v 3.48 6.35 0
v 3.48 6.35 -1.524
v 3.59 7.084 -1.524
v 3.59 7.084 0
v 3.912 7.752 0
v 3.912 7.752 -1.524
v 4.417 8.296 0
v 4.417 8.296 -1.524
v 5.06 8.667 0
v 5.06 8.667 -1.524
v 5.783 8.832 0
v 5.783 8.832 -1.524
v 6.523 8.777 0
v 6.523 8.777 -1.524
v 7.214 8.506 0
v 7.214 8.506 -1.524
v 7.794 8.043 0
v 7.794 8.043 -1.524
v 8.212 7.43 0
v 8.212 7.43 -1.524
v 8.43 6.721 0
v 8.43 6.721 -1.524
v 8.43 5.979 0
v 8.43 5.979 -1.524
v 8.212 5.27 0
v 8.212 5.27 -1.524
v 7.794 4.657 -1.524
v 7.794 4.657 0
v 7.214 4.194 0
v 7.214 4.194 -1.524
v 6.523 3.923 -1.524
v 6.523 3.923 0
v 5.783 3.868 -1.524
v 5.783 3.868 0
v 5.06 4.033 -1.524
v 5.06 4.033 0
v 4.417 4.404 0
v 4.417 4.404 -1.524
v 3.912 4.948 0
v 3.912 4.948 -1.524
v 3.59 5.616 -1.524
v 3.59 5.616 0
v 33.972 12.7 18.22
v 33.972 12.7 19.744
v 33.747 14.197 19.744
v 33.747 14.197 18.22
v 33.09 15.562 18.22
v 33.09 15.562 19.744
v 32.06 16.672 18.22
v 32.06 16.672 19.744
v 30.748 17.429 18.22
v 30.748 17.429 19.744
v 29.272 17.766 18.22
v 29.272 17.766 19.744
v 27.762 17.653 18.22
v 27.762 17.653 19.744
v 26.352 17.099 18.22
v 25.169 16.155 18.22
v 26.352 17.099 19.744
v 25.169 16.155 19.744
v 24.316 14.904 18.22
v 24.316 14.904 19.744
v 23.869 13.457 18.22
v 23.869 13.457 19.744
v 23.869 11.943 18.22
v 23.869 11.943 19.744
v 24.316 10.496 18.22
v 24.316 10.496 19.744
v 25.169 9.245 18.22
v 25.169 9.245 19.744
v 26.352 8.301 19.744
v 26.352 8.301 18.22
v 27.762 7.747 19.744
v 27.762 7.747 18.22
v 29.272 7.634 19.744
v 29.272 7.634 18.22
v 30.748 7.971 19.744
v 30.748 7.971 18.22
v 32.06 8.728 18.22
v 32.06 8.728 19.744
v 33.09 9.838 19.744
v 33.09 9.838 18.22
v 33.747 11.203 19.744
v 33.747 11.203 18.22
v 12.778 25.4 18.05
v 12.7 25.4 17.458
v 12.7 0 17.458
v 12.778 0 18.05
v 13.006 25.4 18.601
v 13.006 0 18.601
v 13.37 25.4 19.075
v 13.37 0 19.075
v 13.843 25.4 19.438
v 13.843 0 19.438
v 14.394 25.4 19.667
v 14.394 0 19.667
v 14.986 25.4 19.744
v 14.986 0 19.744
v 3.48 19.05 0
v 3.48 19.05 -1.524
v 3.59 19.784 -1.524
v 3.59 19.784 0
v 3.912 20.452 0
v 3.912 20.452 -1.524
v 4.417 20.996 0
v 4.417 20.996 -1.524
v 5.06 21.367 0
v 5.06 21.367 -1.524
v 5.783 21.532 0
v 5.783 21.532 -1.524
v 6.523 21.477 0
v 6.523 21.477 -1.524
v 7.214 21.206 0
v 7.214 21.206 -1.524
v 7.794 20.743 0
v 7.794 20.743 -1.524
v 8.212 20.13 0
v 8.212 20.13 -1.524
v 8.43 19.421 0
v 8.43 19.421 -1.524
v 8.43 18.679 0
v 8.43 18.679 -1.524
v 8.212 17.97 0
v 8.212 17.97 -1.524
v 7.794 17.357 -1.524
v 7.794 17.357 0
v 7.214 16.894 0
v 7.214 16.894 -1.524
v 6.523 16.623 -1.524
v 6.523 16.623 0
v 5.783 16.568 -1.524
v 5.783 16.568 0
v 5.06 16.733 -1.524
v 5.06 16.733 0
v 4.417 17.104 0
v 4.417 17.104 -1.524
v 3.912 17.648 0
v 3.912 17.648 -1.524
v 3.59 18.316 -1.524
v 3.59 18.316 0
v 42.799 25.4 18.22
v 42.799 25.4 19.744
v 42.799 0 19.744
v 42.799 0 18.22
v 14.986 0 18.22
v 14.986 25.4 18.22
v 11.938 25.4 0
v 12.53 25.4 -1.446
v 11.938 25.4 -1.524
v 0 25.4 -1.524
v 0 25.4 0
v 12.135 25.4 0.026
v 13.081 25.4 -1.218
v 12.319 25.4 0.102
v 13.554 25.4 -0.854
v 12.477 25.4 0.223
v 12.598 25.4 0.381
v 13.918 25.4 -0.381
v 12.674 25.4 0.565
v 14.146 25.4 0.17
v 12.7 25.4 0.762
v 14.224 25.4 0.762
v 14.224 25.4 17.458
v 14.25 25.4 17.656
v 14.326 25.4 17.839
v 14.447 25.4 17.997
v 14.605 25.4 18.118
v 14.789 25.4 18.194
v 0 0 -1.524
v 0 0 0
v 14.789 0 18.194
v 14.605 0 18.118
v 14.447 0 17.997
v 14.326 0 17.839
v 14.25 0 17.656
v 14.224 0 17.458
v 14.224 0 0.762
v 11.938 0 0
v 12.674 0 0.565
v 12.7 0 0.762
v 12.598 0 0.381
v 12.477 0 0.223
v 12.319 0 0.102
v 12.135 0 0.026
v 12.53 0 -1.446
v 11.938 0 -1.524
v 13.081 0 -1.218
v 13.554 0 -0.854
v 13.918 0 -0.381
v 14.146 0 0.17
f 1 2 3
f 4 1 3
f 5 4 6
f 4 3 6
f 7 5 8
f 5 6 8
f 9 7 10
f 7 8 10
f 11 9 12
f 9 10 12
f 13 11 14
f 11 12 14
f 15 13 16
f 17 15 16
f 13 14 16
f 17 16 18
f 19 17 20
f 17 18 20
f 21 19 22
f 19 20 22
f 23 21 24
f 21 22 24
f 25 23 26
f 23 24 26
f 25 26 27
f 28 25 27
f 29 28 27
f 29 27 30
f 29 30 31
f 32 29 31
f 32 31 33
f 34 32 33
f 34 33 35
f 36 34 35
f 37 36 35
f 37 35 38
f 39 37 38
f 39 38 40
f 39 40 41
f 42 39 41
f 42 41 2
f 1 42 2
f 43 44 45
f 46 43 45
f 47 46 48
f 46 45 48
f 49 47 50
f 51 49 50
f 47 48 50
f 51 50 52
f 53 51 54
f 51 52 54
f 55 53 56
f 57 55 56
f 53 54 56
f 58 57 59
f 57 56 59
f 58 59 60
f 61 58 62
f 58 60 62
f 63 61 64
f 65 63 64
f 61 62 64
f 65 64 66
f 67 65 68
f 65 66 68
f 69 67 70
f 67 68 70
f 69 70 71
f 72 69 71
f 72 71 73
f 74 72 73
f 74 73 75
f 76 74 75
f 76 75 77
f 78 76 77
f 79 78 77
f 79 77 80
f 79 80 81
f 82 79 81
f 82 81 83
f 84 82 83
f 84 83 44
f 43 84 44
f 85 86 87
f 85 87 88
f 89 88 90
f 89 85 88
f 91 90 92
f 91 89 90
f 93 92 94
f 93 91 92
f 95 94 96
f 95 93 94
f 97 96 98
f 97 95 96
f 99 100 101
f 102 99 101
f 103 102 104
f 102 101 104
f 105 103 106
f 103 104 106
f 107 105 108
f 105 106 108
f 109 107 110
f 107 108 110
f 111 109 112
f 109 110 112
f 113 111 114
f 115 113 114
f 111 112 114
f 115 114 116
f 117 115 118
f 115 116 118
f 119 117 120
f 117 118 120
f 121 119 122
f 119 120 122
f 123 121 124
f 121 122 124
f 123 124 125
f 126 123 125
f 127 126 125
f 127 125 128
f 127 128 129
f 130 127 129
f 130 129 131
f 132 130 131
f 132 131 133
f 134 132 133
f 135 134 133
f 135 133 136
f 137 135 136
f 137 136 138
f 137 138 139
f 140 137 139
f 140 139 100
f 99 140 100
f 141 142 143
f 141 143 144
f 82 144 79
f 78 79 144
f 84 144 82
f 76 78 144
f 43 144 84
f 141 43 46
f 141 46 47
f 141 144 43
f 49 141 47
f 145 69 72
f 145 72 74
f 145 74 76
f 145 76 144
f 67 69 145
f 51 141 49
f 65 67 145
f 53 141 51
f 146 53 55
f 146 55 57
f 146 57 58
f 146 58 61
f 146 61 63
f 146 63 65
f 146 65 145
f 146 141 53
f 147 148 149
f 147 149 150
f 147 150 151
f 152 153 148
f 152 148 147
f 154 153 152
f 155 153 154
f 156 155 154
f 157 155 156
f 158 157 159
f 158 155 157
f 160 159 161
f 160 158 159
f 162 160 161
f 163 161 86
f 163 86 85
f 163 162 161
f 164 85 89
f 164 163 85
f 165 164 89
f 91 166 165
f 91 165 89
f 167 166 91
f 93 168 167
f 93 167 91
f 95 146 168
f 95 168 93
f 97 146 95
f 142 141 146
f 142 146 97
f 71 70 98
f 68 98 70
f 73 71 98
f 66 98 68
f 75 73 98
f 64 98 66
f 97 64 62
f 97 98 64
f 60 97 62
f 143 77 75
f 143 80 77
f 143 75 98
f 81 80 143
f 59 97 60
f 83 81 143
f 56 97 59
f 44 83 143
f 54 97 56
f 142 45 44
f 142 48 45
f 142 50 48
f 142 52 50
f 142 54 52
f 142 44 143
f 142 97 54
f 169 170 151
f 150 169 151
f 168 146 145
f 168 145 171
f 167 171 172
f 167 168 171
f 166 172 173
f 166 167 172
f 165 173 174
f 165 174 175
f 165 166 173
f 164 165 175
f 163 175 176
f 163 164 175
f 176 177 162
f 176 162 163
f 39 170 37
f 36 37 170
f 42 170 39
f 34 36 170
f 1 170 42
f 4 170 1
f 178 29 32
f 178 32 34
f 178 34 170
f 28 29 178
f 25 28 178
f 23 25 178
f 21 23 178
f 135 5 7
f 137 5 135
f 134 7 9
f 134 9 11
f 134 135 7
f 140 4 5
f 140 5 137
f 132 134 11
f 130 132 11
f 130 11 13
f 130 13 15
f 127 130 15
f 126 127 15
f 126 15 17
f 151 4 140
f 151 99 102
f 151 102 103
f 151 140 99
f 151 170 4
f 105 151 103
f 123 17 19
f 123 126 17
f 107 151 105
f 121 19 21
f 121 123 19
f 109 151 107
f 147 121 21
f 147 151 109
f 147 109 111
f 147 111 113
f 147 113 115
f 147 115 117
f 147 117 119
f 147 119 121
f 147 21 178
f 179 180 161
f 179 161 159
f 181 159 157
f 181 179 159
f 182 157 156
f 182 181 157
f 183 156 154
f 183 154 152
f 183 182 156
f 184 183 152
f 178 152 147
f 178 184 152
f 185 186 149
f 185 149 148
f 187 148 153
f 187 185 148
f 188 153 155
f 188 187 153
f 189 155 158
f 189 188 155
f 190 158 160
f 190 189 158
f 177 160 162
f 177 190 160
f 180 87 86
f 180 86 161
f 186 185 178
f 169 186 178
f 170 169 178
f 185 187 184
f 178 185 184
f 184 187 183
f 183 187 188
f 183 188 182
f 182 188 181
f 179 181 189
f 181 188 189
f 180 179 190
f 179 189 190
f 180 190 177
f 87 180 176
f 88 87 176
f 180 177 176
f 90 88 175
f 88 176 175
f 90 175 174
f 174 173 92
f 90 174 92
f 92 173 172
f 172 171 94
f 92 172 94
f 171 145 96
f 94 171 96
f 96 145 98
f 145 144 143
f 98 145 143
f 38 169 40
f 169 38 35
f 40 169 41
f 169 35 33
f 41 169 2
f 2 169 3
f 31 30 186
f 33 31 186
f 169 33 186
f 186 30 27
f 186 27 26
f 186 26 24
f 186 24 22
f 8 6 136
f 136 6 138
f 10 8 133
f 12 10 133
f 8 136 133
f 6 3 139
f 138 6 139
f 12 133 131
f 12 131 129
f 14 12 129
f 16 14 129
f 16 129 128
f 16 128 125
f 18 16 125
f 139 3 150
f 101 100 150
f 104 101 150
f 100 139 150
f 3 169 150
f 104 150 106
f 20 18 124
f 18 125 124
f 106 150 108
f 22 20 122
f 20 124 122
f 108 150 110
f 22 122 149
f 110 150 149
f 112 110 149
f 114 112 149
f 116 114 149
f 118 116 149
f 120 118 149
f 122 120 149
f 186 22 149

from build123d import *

# Parameters (mm, degrees)
SKETCH5_W                    = 12.7
SKETCH5_H                    = 25.4
BASE_FLANGE1_DEPTH           = 1.524
EDGE_FLANGE1_STRIP_W         = 7.62
EDGE_FLANGE1_STRIP_H         = 1.524
EDGE_FLANGE1_STRIP_CUT_DEPTH = 25.4
EDGE_FLANGE1_DEPTH           = 25.4
EDGE_FLANGE2_STRIP_W         = 7.62
EDGE_FLANGE2_STRIP_H         = 1.524
EDGE_FLANGE2_STRIP_CUT_DEPTH = 25.4
EDGE_FLANGE2_DEPTH           = 25.4
CUT_EXTRUDE1_REACH           = 56.123
SKETCH16_R                   = 5.08
F_10_CLEARANCE_HOLE2_D       = 4.9784


# Sheet-metal steps are written as plain solids
with BuildPart() as part:
    # Sketch5 → Base-Flange1 (new body)
    with BuildSketch(Plane.XY):
        with Locations((6.35, 12.7)):
            Rectangle(SKETCH5_W, SKETCH5_H)
    extrude(amount=-BASE_FLANGE1_DEPTH)

    # Edge-Flange1 strip (across the edge) → Edge-Flange1 strip cut (cut)
    with BuildSketch(Plane(origin=(12.7, 0, 0), x_dir=(-1, 0, 0), z_dir=(0, 1, 0))):
        with Locations((-3.048, -0.762)):
            Rectangle(EDGE_FLANGE1_STRIP_W, EDGE_FLANGE1_STRIP_H)
    extrude(amount=EDGE_FLANGE1_STRIP_CUT_DEPTH, mode=Mode.SUBTRACT)

    # Edge-Flange1 section (across the edge) → Edge-Flange1 (add)
    with BuildSketch(Plane(origin=(12.7, 0, 0), x_dir=(-1, 0, 0), z_dir=(0, 1, 0))):
        with BuildLine():
            Line((-1.524, 0.762), (-1.524, 18.22041314))
            Line((-1.524, 18.22041314), (0, 18.22041314))
            Line((0, 18.22041314), (0, 0.762))
            ThreePointArc((0, 0.762), (0.223184633, 0.223184633), (0.762, 0))
            Line((0.762, 0), (0.762, -1.524))
            ThreePointArc((0.762, -1.524), (-0.854446102, -0.854446102), (-1.524, 0.762))
        make_face()
    extrude(amount=EDGE_FLANGE1_DEPTH)

    # Edge-Flange2 strip (across the edge) → Edge-Flange2 strip cut (cut)
    with BuildSketch(Plane(origin=(14.224, 25.4, 18.22041314), x_dir=(0, 0, -1), z_dir=(0, -1, 0))):
        with Locations((-3.048, -0.762)):
            Rectangle(EDGE_FLANGE2_STRIP_W, EDGE_FLANGE2_STRIP_H)
    extrude(amount=EDGE_FLANGE2_STRIP_CUT_DEPTH, mode=Mode.SUBTRACT)

    # Edge-Flange2 section (across the edge) → Edge-Flange2 (add)
    with BuildSketch(Plane(origin=(14.224, 25.4, 18.22041314), x_dir=(0, 0, -1), z_dir=(0, -1, 0))):
        with BuildLine():
            Line((-1.524, 0.762), (-1.524, 28.575))
            Line((-1.524, 28.575), (0, 28.575))
            Line((0, 28.575), (0, 0.762))
            ThreePointArc((0, 0.762), (0.223184633, 0.223184633), (0.762, 0))
            Line((0.762, 0), (0.762, -1.524))
            ThreePointArc((0.762, -1.524), (-0.854446102, -0.854446102), (-1.524, 0.762))
        make_face()
    extrude(amount=EDGE_FLANGE2_DEPTH)

    # Sketch16 → Cut-Extrude1 (cut, up to next)
    with BuildSketch(Plane.XY.offset(19.74441314), mode=Mode.PRIVATE) as cut_extrude1_sk1:
        with Locations((28.8925, 12.7)):
            Circle(SKETCH16_R)
    cut_extrude1_tool1 = extrude(cut_extrude1_sk1.sketch, amount=-CUT_EXTRUDE1_REACH, mode=Mode.PRIVATE) & part.part
    add(cut_extrude1_tool1.solids().sort_by_distance((28.8925, 12.7, 19.744413))[0], mode=Mode.SUBTRACT)

    # #10 Clearance Hole2 (through all)
    with Locations(Plane.XY):
        with Locations((5.969, 19.05), (5.969, 6.35)):
            Hole(F_10_CLEARANCE_HOLE2_D / 2)


solid = part.part
